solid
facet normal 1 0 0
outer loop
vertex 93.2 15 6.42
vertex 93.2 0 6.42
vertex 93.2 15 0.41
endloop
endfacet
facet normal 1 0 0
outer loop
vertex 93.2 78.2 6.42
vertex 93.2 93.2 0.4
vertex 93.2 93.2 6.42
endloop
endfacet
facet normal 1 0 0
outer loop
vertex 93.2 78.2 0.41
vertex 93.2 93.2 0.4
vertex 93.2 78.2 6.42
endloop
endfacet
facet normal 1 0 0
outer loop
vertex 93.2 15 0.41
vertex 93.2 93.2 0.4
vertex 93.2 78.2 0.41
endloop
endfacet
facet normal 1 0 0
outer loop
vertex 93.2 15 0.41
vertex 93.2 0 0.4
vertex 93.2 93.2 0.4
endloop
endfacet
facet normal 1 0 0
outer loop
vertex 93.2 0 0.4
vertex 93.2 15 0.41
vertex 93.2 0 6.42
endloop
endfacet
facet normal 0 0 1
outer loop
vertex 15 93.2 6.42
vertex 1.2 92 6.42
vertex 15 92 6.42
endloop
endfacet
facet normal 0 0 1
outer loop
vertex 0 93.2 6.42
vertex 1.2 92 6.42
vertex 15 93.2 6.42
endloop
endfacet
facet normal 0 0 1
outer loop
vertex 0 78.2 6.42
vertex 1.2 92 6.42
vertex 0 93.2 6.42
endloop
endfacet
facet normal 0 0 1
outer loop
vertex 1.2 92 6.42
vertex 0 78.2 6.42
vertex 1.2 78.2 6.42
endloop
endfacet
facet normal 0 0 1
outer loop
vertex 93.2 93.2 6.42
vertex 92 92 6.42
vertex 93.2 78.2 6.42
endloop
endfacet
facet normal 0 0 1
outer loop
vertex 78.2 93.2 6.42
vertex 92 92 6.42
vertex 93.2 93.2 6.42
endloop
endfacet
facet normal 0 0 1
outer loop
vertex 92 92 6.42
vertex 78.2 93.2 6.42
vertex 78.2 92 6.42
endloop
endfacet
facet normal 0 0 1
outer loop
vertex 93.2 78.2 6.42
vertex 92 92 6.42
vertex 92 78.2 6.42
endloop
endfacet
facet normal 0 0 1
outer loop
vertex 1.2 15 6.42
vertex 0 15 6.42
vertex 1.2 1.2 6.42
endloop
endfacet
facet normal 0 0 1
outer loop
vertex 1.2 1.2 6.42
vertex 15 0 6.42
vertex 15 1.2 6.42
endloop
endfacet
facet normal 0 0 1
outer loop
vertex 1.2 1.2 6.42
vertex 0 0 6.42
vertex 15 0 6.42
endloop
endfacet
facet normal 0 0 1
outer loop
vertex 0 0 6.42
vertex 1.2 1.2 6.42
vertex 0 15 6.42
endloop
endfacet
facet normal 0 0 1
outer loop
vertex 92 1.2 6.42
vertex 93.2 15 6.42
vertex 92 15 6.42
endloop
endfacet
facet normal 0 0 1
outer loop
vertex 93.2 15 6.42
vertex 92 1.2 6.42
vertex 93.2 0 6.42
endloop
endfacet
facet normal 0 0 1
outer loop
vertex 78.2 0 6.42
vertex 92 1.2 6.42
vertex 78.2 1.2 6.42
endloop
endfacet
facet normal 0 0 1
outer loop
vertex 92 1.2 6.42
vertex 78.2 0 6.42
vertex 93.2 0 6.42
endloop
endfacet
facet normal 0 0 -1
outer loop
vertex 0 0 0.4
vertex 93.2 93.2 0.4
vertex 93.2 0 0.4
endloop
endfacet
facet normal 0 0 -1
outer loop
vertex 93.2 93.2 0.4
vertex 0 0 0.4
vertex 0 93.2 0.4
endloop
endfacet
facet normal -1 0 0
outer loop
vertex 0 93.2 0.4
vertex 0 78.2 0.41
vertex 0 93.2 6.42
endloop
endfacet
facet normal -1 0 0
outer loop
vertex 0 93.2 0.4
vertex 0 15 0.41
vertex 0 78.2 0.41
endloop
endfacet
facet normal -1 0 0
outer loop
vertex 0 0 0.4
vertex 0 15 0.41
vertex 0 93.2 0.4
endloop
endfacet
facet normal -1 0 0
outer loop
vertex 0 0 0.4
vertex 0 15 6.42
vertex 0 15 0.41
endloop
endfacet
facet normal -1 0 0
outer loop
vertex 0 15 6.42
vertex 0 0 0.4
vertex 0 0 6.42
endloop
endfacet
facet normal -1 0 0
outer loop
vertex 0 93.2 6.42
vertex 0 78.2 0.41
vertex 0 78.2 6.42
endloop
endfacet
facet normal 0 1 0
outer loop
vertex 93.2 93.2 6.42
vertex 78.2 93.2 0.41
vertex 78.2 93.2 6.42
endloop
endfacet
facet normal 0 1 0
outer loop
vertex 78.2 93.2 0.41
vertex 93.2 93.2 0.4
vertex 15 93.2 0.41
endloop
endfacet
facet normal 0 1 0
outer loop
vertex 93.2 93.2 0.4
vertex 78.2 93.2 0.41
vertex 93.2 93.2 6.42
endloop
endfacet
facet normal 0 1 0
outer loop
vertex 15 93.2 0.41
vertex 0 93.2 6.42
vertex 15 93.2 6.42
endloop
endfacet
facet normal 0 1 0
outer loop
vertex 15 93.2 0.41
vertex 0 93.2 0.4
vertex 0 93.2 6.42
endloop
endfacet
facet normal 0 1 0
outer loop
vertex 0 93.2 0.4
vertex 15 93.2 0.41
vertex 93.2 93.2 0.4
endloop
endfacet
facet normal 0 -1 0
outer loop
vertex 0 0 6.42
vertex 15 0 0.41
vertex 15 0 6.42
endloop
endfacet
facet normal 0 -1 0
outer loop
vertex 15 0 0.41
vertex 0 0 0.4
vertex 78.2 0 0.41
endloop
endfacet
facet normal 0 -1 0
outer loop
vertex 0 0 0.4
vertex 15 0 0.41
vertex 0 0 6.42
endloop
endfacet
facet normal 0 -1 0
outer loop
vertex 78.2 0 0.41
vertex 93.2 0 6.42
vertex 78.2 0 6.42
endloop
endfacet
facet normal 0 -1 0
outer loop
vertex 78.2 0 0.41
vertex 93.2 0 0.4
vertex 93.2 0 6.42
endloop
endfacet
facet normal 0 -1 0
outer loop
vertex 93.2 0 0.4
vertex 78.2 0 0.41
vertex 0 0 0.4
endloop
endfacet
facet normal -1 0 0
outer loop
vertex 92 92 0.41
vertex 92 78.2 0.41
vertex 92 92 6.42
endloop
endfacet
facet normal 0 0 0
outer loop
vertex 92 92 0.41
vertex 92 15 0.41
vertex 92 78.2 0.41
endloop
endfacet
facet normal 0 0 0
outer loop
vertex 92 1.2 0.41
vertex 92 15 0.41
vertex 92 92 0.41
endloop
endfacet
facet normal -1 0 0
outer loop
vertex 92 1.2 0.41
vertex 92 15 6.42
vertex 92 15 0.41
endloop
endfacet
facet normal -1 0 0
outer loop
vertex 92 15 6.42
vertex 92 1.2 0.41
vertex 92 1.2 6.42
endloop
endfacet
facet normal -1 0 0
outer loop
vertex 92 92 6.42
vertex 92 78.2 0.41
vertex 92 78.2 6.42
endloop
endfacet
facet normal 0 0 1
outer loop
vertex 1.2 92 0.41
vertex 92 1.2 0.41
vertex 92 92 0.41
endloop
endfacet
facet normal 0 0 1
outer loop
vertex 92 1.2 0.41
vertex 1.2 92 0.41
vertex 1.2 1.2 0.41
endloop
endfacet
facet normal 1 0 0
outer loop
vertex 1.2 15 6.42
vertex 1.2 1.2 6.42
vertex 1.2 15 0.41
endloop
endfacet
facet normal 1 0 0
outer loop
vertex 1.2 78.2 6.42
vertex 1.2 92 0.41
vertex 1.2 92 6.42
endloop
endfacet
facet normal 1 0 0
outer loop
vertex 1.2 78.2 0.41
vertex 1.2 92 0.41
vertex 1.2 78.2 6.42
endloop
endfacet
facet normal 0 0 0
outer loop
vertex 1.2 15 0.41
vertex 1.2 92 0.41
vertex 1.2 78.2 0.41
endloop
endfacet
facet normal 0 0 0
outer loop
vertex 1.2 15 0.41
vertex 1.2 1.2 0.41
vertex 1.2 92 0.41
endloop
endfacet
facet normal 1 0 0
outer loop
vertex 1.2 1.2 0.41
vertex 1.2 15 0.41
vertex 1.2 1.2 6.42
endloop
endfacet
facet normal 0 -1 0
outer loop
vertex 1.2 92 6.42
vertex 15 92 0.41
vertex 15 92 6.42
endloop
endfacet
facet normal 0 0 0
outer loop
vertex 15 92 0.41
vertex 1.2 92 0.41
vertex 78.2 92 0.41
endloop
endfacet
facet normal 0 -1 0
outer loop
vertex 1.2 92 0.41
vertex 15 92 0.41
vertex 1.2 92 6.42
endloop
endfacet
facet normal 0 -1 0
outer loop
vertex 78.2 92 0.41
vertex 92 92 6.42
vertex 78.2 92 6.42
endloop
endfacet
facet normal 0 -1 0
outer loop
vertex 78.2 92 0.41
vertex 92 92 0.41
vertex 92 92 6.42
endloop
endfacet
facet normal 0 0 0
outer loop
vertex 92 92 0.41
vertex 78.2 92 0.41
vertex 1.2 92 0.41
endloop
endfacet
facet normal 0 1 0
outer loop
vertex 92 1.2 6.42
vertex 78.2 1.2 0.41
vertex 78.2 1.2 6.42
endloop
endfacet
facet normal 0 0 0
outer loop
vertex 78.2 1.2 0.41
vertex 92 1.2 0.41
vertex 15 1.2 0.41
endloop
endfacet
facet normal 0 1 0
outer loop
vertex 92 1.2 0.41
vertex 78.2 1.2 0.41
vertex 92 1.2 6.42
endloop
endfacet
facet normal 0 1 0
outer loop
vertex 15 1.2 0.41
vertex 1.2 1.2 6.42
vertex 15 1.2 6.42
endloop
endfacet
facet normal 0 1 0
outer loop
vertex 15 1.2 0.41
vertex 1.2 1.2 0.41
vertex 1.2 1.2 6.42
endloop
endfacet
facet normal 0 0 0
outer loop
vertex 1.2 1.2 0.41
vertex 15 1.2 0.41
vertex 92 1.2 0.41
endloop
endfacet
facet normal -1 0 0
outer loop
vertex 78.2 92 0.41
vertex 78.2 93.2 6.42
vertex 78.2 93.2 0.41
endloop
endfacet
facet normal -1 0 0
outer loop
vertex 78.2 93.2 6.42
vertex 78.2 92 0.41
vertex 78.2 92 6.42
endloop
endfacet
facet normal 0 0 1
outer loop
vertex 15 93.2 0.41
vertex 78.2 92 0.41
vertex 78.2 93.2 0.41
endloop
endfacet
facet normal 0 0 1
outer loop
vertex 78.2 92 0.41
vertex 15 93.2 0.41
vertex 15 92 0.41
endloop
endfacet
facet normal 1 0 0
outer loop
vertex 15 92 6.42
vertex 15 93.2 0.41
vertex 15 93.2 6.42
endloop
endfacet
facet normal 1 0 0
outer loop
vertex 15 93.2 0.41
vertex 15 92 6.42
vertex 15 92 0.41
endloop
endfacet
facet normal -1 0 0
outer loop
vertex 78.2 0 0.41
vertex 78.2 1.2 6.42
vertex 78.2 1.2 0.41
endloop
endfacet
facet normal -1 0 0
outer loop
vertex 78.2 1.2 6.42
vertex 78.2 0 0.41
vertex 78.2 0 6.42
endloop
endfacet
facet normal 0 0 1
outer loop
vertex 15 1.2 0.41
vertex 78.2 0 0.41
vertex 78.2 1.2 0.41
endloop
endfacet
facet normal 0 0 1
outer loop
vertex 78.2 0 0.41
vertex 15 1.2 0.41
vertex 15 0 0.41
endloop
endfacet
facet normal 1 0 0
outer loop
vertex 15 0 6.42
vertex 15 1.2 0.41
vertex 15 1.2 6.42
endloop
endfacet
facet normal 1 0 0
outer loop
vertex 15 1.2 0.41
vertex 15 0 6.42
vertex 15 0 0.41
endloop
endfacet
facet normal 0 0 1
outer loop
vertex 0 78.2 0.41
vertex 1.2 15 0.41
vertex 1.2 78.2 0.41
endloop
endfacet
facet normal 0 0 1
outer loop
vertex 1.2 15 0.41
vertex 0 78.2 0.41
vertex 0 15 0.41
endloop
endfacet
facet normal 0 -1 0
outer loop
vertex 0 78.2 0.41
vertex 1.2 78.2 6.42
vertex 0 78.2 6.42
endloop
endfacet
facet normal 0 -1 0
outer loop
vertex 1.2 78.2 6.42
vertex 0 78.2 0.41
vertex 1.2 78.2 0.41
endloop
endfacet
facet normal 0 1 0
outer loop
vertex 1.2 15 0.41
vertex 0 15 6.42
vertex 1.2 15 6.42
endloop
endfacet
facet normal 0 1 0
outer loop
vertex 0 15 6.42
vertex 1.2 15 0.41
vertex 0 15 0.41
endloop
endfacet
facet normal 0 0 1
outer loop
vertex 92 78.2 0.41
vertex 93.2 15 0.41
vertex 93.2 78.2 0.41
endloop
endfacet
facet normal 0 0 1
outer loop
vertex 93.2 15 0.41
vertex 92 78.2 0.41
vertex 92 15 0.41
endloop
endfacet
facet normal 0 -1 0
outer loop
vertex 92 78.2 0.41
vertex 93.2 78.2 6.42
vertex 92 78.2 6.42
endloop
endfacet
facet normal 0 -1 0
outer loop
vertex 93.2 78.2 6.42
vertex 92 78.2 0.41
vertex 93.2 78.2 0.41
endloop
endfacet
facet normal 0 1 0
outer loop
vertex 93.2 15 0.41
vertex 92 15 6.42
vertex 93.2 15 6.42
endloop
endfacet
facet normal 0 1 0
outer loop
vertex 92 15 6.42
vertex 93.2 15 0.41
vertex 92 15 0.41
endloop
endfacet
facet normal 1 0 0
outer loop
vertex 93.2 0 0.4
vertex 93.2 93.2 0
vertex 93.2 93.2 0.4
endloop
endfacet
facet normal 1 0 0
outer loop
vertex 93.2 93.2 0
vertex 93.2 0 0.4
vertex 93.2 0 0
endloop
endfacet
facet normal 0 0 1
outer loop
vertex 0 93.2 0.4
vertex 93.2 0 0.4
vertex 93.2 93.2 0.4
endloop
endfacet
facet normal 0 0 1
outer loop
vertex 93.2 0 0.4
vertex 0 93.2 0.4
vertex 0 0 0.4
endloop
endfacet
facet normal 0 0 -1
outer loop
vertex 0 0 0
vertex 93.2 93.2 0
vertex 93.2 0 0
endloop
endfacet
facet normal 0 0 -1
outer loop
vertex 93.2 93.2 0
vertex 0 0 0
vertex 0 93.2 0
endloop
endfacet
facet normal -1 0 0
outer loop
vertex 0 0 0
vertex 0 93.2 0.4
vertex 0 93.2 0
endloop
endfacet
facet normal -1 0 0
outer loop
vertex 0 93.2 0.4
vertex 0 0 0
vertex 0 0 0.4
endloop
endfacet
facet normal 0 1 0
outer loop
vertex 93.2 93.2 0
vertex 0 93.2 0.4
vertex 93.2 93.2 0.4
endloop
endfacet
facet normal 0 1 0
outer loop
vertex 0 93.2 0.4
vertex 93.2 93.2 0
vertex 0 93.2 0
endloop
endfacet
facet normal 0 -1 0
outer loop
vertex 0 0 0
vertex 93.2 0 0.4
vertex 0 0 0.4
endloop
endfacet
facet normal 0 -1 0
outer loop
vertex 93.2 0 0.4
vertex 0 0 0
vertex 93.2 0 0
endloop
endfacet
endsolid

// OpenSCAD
// file: ../../Base/Rotation.scad
// Fischertechnik Box Foundation
// Geometry Helpers Rotation

include <PlacementOptions.scad>

// getRotatedSpace(space, rotation=NoRotation)
// Rotates the space dependent on the specified rotation

function getRotatedSpace(space, rotation=NoRotation) = [
    (rotation == Rotate90 || rotation == Rotate270) ? space.y : space.x,
    (rotation == Rotate90 || rotation == Rotate270) ? space.x : space.y
];

// Rotates the given space around the fixed left lower corner
// space = the space the children needs as width/depth list [width,depth]
// rotation = 0 Rotate0 degrees, 1 Rotate90 degrees, 2 Rotate180 degrees, 3 Rotate270 degrees (equivalent to -90)

module RotateFix(space, rotation=NoRotation) {
    dy = (rotation == Rotate0 || rotation == Rotate270) ? 0 :
        (rotation == Rotate90) ? space.x :
        space.y;
    dx = (rotation < Rotate180) ? 0 :
        (rotation == Rotate180) ? space.x :
        space.y;
    
    translate([dx, dy, 0])
        rotate([0, 0, rotations[rotation]])
            children();
}
// file: ../../Base/Alignment.scad
// Fischertechnik Box Foundation
// Geometry Helpers Alignment

include <PlacementOptions.scad>

// getAlignedX(elementWidth, spaceWidth, align=AlignRight, offset=0)
// Gets the aligned X offset of an element with the given
// width in the given space.
// elementWidth = The width of the element to positon
// spaceWidth = The space where the element should be aligned
// align = 0 AlignLeft, 1 AlignCenter, 2 AlignRight
// offset = an optional offset from the aligned position. When
// aligned left or centered, then positive values are in X direction.
// When aligned right then positive values are in negative X direction.

function getAlignedX(elementWidth, spaceWidth, align=AlignRight, offset=0) =
    (align == AlignLeft) ?
        offset :
        ((align == AlignCenter) ?
        (spaceWidth - elementWidth)/2 + offset :
        spaceWidth - offset - elementWidth);

// getAlignedY(elementDepth, spaceDepth, align=AlignTop, offset=0)
// Gets the aligned Y offset of an element with the given
// depth in the given space.
// elementDepth = The depth of the element to positon
// spaceDepth = The space where the element should be aligned
// align = 0 AlignBottom, 1 AlignCenter, 2 AlignTop
// offset = an optional offset from the aligned position. When
// aligned bottom or centered, then positive values are in Y direction.
// When aligned top then positive values are in negative Y direction.

function getAlignedY(elementDepth, spaceDepth, align=AlignTop, offset=0) =
    (align == AlignBottom) ?
        offset :
        ((align == AlignCenter) ?
        (spaceDepth - elementDepth)/2 + offset :
        spaceDepth - offset - elementDepth);
// file: ../../Base/Boxes.scad
// Fischertechnik Box Foundation
// Pre-designed Boxes

use <Constants.scad>

include <PlacementOptions.scad>

box190Width = 190;
box190Depth = 130;
box130Width = 130;
box130Depth = 95;

// Values are from an original ec3 box
topBottomDifference = 1.5;
outerHeight = 40;
innerHeight = 38.2;
baseThickness = outerHeight - innerHeight;
stackExcess = 5.7;
radius = 3.5;
wallThickness = 1.5;
tolerance = 0.2;
stackOffset = innerHeight - stackExcess;

boxUsageHeight = stackOffset;
boxWallThickness = wallThickness;
boxBaseThickness = baseThickness;
boxWebWidth = 3.0;

// getBoxWallThickness()
// Gets the wall thickness of a Fischertechnik Box
function getBoxWallThickness() = boxWallThickness;

// getBoxUsageHeight()
// Gets the usable height of a Fischertechnik box
function getBoxUsageHeight() = boxUsageHeight;

// getBoxInnerHeight()
// Gets the inner height of a Fischertechnik box, including the stack excess
function getBoxInnerHeight() = innerHeight;

// getBoxBaseThickness()
// Gets the thickness of the Fischertechnik box base.
function getBoxBaseThickness() = boxBaseThickness;

// getBoxWebWidth()
// Gets the width of a box web
function getBoxWebWidth() = boxWebWidth;

// getBox190Space()
// Gets the usable inner space of a Box 190 as an x/y-list
function getBox190Space() = [
    box190Width - 2*getBoxWallThickness() - topBottomDifference, 
    box190Depth - 2*getBoxWallThickness() - topBottomDifference ];

// BoxBase(width, depth)
// Creates an empty stackable Fischertechnik compatible box
// width = Outer width of the box (190, 130, ...)
// depth = Outer depth of the box (130, 95, ...)

module BoxBase(width, depth, height=outerHeight) {    
    thinPlate = 0.01;

    innerHeight = height - baseThickness;    
    
    module BodyPlate(width, depth) {
        translate([radius, radius])
        hull() {
            w = width-2*radius;
            d = depth-2*radius;
            cube([w, d, thinPlate]);
            cylinder(thinPlate, r=radius, $fn=getFragments());
            translate([w, 0])
                cylinder(thinPlate, r=radius, $fn=getFragments());
            translate([w, d])
                cylinder(thinPlate, r=radius, $fn=getFragments());
            translate([0, d])
                cylinder(thinPlate, r=radius, $fn=getFragments());
        }
    }
    
    module Body(tolerance=tolerance) {
        hull() {
            // Bottom with tolerance to fit into the original boxes when stacked
            translate([-wallThickness+tolerance, -wallThickness+tolerance, -baseThickness])
                BodyPlate(width-topBottomDifference-2*tolerance, depth-topBottomDifference-2*tolerance);
            
            // Top
            translate([-wallThickness-topBottomDifference/2, -wallThickness-topBottomDifference/2, innerHeight-thinPlate])
                BodyPlate(width, depth);
         }
    }

    module Cutoff() {
        hull() {
            coWidth = width - 2*wallThickness;
            coDepth = depth - 2*wallThickness;
            
            // Bottom
            BodyPlate(coWidth-topBottomDifference, coDepth-topBottomDifference);

            // Top
            translate([-topBottomDifference/2, -topBottomDifference/2, innerHeight+thinPlate]) 
                BodyPlate(coWidth, coDepth);
        }
    }
    
    difference() {        
        Body();
        Cutoff();
        stackOffset = innerHeight - stackExcess;
        translate([0, 0, stackOffset + baseThickness])
            Body(tolerance=0);
    }
}

// Creates the Fischertechnik empty box 130x190 mm and places it at position 0,0
// 190x130 are the outer sizes, the inner space is slightly smaller. Use getBox190Space() to get the inner sizes.
// The box is positioned that the usable inner space is at the 0,0,0 position. The

module Box190() {
    BoxBase(box190Width, box190Depth);
}

// Gets the usable inner space of a Box 130 as an x/y-list
function getBox130Space() = [
    box130Width - 2*getBoxWallThickness() - topBottomDifference, 
    box130Depth - 2*getBoxWallThickness() - topBottomDifference ];

// Creates the Fischertechnik empty box 95x130 mm and places it at position 0,0
// 190x130 are the outer sizes, the inner space is slightly smaller. Use getBox190Space() to get the inner sizes.
// The box is positioned that the usable inner space is at the 0,0,0 position. The

module Box130() {
    BoxBase(box130Width, box130Depth);
}

// Creates a web at the specified box walls
// corner 0 = LowerLeft, 1 = UpperLeft, 2 = UpperRight, 3 = LowerRight
// side 0 = LeftOfCorner, 1 = RightOfCorner
// distance = Distance in mm from the corner
// boxSpace = inner width and depth of the box (default: Box 190)
// webWidth = length of the web (default is 3 mms)
// webThickness = thickness of the web (default is 1 mm)

module BoxWeb(corner, side, distance, boxSpace=getBox190Space(), webWidth=getBoxWebWidth(), webThickness=1.0) {
    sink = getBoxWallThickness()/2;

    width = (corner % 2 == 0) ? 
            (side == LeftOfCorner ? webWidth : webThickness) :
            (side == LeftOfCorner ? webThickness : webWidth);

    depth = (corner % 2 == 0) ? 
            (side == RightOfCorner ? webWidth : webThickness) :
            (side == RightOfCorner ? webThickness : webWidth);
    
    xDiff = corner == LowerLeft ? 
                (side == LeftOfCorner ? -sink : distance) :
            (corner == UpperLeft ?                
                (side == LeftOfCorner ? distance : -sink) :
            (corner == UpperRight ?
                (side == LeftOfCorner ? boxSpace.x-webWidth+sink : boxSpace.x-distance-webThickness) :
                (side == LeftOfCorner ? boxSpace.x-distance-webThickness: boxSpace.x-webWidth+sink)));

    yDiff = corner == LowerLeft ? 
                (side == RightOfCorner ? -sink : distance) :
            (corner == UpperLeft ?
                (side == RightOfCorner ? boxSpace.y-distance : boxSpace.y-webWidth+sink) :
            (corner == UpperRight ?
                (side == RightOfCorner ? boxSpace.y-webWidth+sink : boxSpace.y-distance) :
                (side == RightOfCorner ? distance : -sink)));
    
    translate([xDiff, yDiff, -getExcess()])
        cube([width, depth, boxUsageHeight + 2*getExcess()]);
}
// file: ../../Base/Placement.scad
// Fischertechnik Box Foundation
// Geometry Helpers Placement

use <Constants.scad>
use <Alignment.scad>
use <Rotation.scad>
use <Boxes.scad>

include <PlacementOptions.scad>

// Place(x=0, y=0, elementSpace=[0,0], alignX=AlignLeft, alignY=AlignBottom, rotation=Rotate0, boxSpace=getBox190Space())
// Places the child at the specified position
// y = Y-Position. This is a relative position when an X aligment is specified.
// x = X-Position. This is a relative position when an Y aligment is specified.
// elementSpace = space of the element to be placed [x,y]
// alignX = -1=NoAlign, 0 AlignLeft, 1 AlignCenter, 3 AlignRight (elementSpace and boxSpace required!)
// alignY = -1=NoAlign, 2 AlignBottom, 1 AlignCenter, 4 AlignTop (elementSpace and boxSpace required!)
// rotation = 0 Rotate0 0 degrees, 1 Rotate90 90 degrees, 
// 2 Rotate180 180 degrees, 3 Rotate270 270 degrees (equivalent to -90)
// boxSpace = Inner space of the box where the placement occurs [x,y] - default is Box 190x130 inner space

module Place(x=0, y=0, elementSpace=[0,0], 
  alignX=AlignLeft, alignY=AlignBottom, 
  rotation=NoRotation, boxSpace=getBox190Space()) {

    module Position(x, y, space, rotation=Rotate0) {
        translate([x, y, 0])
            RotateFix(space, rotation)
                children();
    }

    space = getRotatedSpace(elementSpace, rotation);
    alignedX = getAlignedX(space.x, boxSpace.x, alignX, x);
    alignedY = getAlignedY(space.y, boxSpace.y, alignY, y);
    Position(alignedX, alignedY, elementSpace, rotation)
        children();
}

// Center(space=getBox130Space(), elementSpace=[0,0])
// space = Space where the children is centered. For cylinder use centered=true and no elementSpace.
// elementSpace = space of the element to be centered [x,y]

module Center(space=getBox190Space(), elementSpace=[0,0]) {
    Place(elementSpace=elementSpace, boxSpace=space, alignX=AlignCenter, alignY=AlignCenter)
        children();
}

// CenterHorizontal(width=0, y=0, offset=0, space=getBox130Space())
// width = Width of the element to be placed.
// y = Y position of the element
// offset = Offset from the center position (negative will be left of the center)
// space = Space where the element is placed

module CenterHorizontal(width=0, y=0, offset=0, space=getBox190Space()) {
    Place(x=offset, y=y, elementSpace=[width, 0], boxSpace=space, alignX=AlignCenter)
        children(0);
}

// CenterVertical(depth=0, x=0, offset=0, space=getBox130Space())
// depth = Depth of the element to be placed.
// x = X position of the element
// offset = Offset from the center position (negative will be down of the center)
// space = Space where the element is placed

module CenterVertical(depth=0, x=0, offset=0, space=getBox190Space()) {
    Place(x=x, y=offset, elementSpace=[0, depth], boxSpace=space, alignY=AlignCenter)
        children(0);
}

// getIsVertical(align)
// True if the specified alignment needs a vertical orientation for a divider (AlignRight, AlignLeft)

function getIsVertical(align) = (align == AlignRight || align == AlignLeft);

// getIsHorizontal(align)
// True if the specified alignment needs a horizontal orientation for a divider (AlignTop, AlignBottom)

function getIsHorizontal(align) = (align == AlignTop || align == AlignBottom);
// file: ../../Base/PlacementOptions.scad
// Fischertechnik Box Foundation
// Placement Options

// Alignment
NoAlign = 0;
AlignLeft = 1;
AlignBottom = 2;
AlignCenter = 3;
AlignRight = 4;
AlignTop = 5;

// Element rotation degree steps
rotations = [0, -90, -180, -270];

// Rotation
NoRotation = 0;
Rotate0 = 0;
Rotate90 = 1;
Rotate180 = 2;
Rotate270 = 3;

// Docking (seen from above)
NoDock = -1;
DockLeft = 0;
DockTop = 1;
DockRight = 2;
DockCorner = 2;
DockBottom = 3;

// Web corners
LowerLeft = 0;
UpperLeft = 1;
UpperRight = 2;
LowerRight = 3;

// Web position relative to corner
LeftOfCorner = 0;
RightOfCorner = 1;
// file: ../../Elements/AxisClip10.scad
// Fischertechnik Box Library
// Axis for clip 10
// 31023

use <../ModelBase/Simple.scad>
use <../Base/Constants.scad>

width = 12;
depth = 12;
height = 23;
upperDiameter = 3.6;
clipHeight = 10;

// getAxisClip10Space()
// Gets the space of a frame for a clip 10 with spring ring (mot2)

function getAxisClip10Space() = [width, depth, height];

// AxisClip10(height, clipHeight)
// Axis for clip 10 with spring ring (mot2)
// height = Height of the complete axis
// clipHeight = Height of the rt for the clip (standard is 10, in mot3 its only 7)

module AxisClip10(height=height, clipHeight=clipHeight) {
    LeveledAxisWithSpace(height, height-clipHeight, getAxisClip10Space(), diameter=upperDiameter);
}

// Tests
color("lightgray")
AxisClip10();
// file: ../../Base/Constants.scad
// Fischertechnik Box Foundation
// Constants

// Constant values necessary for multiple elements

// Base constants
dividerThickness = 1.2;
excess = 0.01;
fragments = 90;
tolerance = 0.8;

// Gets the thickness of a divider 
function getDividerThickness() = dividerThickness;

// Gets the excess that is used to merge walls into each other
function getExcess() = excess;

// Gets amount of fragments of a cylinder
function getFragments() = fragments;

// Gets the inner tolerance of a frame to each side
function getTolerance() = tolerance;


// Fischertechnik specific constants
axisDiameter = 4;
axisBottomDiameter = axisDiameter + 1;
standardEdgeDistance = 2.5;
standardWebDistance = 11.5;
standardCornerLength = 15;
tubeWallFactor = 0.8;
smallPartsFrameHeight = 20;

// Gets axis diameter
function getAxisDiameter() = axisDiameter;

// Gets axis bottom diameter for thicker part at the bottom
function getAxisBottomDiameter() = axisBottomDiameter;

// gets the standard distance to the wall of the box for dockable frames with webs
function getStandardEdgeDistance() = standardEdgeDistance;

// gets the standard distance of each web to the corner of the dockable frame
function getStandardWebDistance() = standardWebDistance;

// gets the standard length of the corner walls of a dockable frame
function getStandardCornerLength() = standardCornerLength;

// gets the wall thickness of a tube.
function getTubeWallThickness() = tubeWallFactor * getDividerThickness();

// gets the frame height for docked small parts boxes.
function getSmallPartsFrameHeight() = smallPartsFrameHeight;
// file: ../../Elements/FrameTXTController.scad
// Fischertechnik Box Library
// Frame for TX/TXT controller
// 153513, 173067, 500995, 

use <../Base/Constants.scad>
use <../ModelBase/Simple.scad>
use <../ModelBase/Complex.scad>

include <../Base/PlacementOptions.scad>

width = 90;
depth = 90;
height = 6;

// getFrameTXTControllerSpace(alignX, alignY)
// alignX 0=NoAlign 1=AlignLeft 3=AlignCenter 4=AlignRight 
// alignY 0=AlignNo 2=AlignBottom 3=AlignCenter 5=AlignTop
// Gets the space the frame for a TXT Controller needs as width and depth(.x and .y as a list). 

function getFrameTXTControllerSpace(alignX=NoAlign, alignY=NoAlign) = 
    getDockableEdgedFrameSpace([width, depth, height], alignX, alignY);

// FrameTXTController(alignX, alignY)
// Frame for TXT controller.
// alignX 0=NoAlign 1=AlignLeft 3=AlignCenter 4=AlignRight 
// alignY 0=AlignNo 2=AlignBottom 3=AlignCenter 5=AlignTop

module FrameTXTController(alignX=NoAlign, alignY=NoAlign) {
    DockableEdgedFrame([width, depth, height], alignX, alignY);
}

// Test
color("lightgray") {
    FrameTXTController();
}
// file: ../TestPrint.scad
// 3D Print Test Base

use <../Base/Constants.scad>

use <../Elements/AxisClip10.scad>

module TestPrint(elementSpace) {
    cube([elementSpace.x, elementSpace.y, 0.4]);
    translate([0,0,0.4+getExcess()]) {
        children();
    }
}

TestPrint(getAxisClip10Space())
    AxisClip10();
// main file
// 3D Print Test
// FrameTXTController

use <../TestPrint.scad>
use <../../Elements/FrameTXTController.scad>

TestPrint(getFrameTXTControllerSpace())
    FrameTXTController();
